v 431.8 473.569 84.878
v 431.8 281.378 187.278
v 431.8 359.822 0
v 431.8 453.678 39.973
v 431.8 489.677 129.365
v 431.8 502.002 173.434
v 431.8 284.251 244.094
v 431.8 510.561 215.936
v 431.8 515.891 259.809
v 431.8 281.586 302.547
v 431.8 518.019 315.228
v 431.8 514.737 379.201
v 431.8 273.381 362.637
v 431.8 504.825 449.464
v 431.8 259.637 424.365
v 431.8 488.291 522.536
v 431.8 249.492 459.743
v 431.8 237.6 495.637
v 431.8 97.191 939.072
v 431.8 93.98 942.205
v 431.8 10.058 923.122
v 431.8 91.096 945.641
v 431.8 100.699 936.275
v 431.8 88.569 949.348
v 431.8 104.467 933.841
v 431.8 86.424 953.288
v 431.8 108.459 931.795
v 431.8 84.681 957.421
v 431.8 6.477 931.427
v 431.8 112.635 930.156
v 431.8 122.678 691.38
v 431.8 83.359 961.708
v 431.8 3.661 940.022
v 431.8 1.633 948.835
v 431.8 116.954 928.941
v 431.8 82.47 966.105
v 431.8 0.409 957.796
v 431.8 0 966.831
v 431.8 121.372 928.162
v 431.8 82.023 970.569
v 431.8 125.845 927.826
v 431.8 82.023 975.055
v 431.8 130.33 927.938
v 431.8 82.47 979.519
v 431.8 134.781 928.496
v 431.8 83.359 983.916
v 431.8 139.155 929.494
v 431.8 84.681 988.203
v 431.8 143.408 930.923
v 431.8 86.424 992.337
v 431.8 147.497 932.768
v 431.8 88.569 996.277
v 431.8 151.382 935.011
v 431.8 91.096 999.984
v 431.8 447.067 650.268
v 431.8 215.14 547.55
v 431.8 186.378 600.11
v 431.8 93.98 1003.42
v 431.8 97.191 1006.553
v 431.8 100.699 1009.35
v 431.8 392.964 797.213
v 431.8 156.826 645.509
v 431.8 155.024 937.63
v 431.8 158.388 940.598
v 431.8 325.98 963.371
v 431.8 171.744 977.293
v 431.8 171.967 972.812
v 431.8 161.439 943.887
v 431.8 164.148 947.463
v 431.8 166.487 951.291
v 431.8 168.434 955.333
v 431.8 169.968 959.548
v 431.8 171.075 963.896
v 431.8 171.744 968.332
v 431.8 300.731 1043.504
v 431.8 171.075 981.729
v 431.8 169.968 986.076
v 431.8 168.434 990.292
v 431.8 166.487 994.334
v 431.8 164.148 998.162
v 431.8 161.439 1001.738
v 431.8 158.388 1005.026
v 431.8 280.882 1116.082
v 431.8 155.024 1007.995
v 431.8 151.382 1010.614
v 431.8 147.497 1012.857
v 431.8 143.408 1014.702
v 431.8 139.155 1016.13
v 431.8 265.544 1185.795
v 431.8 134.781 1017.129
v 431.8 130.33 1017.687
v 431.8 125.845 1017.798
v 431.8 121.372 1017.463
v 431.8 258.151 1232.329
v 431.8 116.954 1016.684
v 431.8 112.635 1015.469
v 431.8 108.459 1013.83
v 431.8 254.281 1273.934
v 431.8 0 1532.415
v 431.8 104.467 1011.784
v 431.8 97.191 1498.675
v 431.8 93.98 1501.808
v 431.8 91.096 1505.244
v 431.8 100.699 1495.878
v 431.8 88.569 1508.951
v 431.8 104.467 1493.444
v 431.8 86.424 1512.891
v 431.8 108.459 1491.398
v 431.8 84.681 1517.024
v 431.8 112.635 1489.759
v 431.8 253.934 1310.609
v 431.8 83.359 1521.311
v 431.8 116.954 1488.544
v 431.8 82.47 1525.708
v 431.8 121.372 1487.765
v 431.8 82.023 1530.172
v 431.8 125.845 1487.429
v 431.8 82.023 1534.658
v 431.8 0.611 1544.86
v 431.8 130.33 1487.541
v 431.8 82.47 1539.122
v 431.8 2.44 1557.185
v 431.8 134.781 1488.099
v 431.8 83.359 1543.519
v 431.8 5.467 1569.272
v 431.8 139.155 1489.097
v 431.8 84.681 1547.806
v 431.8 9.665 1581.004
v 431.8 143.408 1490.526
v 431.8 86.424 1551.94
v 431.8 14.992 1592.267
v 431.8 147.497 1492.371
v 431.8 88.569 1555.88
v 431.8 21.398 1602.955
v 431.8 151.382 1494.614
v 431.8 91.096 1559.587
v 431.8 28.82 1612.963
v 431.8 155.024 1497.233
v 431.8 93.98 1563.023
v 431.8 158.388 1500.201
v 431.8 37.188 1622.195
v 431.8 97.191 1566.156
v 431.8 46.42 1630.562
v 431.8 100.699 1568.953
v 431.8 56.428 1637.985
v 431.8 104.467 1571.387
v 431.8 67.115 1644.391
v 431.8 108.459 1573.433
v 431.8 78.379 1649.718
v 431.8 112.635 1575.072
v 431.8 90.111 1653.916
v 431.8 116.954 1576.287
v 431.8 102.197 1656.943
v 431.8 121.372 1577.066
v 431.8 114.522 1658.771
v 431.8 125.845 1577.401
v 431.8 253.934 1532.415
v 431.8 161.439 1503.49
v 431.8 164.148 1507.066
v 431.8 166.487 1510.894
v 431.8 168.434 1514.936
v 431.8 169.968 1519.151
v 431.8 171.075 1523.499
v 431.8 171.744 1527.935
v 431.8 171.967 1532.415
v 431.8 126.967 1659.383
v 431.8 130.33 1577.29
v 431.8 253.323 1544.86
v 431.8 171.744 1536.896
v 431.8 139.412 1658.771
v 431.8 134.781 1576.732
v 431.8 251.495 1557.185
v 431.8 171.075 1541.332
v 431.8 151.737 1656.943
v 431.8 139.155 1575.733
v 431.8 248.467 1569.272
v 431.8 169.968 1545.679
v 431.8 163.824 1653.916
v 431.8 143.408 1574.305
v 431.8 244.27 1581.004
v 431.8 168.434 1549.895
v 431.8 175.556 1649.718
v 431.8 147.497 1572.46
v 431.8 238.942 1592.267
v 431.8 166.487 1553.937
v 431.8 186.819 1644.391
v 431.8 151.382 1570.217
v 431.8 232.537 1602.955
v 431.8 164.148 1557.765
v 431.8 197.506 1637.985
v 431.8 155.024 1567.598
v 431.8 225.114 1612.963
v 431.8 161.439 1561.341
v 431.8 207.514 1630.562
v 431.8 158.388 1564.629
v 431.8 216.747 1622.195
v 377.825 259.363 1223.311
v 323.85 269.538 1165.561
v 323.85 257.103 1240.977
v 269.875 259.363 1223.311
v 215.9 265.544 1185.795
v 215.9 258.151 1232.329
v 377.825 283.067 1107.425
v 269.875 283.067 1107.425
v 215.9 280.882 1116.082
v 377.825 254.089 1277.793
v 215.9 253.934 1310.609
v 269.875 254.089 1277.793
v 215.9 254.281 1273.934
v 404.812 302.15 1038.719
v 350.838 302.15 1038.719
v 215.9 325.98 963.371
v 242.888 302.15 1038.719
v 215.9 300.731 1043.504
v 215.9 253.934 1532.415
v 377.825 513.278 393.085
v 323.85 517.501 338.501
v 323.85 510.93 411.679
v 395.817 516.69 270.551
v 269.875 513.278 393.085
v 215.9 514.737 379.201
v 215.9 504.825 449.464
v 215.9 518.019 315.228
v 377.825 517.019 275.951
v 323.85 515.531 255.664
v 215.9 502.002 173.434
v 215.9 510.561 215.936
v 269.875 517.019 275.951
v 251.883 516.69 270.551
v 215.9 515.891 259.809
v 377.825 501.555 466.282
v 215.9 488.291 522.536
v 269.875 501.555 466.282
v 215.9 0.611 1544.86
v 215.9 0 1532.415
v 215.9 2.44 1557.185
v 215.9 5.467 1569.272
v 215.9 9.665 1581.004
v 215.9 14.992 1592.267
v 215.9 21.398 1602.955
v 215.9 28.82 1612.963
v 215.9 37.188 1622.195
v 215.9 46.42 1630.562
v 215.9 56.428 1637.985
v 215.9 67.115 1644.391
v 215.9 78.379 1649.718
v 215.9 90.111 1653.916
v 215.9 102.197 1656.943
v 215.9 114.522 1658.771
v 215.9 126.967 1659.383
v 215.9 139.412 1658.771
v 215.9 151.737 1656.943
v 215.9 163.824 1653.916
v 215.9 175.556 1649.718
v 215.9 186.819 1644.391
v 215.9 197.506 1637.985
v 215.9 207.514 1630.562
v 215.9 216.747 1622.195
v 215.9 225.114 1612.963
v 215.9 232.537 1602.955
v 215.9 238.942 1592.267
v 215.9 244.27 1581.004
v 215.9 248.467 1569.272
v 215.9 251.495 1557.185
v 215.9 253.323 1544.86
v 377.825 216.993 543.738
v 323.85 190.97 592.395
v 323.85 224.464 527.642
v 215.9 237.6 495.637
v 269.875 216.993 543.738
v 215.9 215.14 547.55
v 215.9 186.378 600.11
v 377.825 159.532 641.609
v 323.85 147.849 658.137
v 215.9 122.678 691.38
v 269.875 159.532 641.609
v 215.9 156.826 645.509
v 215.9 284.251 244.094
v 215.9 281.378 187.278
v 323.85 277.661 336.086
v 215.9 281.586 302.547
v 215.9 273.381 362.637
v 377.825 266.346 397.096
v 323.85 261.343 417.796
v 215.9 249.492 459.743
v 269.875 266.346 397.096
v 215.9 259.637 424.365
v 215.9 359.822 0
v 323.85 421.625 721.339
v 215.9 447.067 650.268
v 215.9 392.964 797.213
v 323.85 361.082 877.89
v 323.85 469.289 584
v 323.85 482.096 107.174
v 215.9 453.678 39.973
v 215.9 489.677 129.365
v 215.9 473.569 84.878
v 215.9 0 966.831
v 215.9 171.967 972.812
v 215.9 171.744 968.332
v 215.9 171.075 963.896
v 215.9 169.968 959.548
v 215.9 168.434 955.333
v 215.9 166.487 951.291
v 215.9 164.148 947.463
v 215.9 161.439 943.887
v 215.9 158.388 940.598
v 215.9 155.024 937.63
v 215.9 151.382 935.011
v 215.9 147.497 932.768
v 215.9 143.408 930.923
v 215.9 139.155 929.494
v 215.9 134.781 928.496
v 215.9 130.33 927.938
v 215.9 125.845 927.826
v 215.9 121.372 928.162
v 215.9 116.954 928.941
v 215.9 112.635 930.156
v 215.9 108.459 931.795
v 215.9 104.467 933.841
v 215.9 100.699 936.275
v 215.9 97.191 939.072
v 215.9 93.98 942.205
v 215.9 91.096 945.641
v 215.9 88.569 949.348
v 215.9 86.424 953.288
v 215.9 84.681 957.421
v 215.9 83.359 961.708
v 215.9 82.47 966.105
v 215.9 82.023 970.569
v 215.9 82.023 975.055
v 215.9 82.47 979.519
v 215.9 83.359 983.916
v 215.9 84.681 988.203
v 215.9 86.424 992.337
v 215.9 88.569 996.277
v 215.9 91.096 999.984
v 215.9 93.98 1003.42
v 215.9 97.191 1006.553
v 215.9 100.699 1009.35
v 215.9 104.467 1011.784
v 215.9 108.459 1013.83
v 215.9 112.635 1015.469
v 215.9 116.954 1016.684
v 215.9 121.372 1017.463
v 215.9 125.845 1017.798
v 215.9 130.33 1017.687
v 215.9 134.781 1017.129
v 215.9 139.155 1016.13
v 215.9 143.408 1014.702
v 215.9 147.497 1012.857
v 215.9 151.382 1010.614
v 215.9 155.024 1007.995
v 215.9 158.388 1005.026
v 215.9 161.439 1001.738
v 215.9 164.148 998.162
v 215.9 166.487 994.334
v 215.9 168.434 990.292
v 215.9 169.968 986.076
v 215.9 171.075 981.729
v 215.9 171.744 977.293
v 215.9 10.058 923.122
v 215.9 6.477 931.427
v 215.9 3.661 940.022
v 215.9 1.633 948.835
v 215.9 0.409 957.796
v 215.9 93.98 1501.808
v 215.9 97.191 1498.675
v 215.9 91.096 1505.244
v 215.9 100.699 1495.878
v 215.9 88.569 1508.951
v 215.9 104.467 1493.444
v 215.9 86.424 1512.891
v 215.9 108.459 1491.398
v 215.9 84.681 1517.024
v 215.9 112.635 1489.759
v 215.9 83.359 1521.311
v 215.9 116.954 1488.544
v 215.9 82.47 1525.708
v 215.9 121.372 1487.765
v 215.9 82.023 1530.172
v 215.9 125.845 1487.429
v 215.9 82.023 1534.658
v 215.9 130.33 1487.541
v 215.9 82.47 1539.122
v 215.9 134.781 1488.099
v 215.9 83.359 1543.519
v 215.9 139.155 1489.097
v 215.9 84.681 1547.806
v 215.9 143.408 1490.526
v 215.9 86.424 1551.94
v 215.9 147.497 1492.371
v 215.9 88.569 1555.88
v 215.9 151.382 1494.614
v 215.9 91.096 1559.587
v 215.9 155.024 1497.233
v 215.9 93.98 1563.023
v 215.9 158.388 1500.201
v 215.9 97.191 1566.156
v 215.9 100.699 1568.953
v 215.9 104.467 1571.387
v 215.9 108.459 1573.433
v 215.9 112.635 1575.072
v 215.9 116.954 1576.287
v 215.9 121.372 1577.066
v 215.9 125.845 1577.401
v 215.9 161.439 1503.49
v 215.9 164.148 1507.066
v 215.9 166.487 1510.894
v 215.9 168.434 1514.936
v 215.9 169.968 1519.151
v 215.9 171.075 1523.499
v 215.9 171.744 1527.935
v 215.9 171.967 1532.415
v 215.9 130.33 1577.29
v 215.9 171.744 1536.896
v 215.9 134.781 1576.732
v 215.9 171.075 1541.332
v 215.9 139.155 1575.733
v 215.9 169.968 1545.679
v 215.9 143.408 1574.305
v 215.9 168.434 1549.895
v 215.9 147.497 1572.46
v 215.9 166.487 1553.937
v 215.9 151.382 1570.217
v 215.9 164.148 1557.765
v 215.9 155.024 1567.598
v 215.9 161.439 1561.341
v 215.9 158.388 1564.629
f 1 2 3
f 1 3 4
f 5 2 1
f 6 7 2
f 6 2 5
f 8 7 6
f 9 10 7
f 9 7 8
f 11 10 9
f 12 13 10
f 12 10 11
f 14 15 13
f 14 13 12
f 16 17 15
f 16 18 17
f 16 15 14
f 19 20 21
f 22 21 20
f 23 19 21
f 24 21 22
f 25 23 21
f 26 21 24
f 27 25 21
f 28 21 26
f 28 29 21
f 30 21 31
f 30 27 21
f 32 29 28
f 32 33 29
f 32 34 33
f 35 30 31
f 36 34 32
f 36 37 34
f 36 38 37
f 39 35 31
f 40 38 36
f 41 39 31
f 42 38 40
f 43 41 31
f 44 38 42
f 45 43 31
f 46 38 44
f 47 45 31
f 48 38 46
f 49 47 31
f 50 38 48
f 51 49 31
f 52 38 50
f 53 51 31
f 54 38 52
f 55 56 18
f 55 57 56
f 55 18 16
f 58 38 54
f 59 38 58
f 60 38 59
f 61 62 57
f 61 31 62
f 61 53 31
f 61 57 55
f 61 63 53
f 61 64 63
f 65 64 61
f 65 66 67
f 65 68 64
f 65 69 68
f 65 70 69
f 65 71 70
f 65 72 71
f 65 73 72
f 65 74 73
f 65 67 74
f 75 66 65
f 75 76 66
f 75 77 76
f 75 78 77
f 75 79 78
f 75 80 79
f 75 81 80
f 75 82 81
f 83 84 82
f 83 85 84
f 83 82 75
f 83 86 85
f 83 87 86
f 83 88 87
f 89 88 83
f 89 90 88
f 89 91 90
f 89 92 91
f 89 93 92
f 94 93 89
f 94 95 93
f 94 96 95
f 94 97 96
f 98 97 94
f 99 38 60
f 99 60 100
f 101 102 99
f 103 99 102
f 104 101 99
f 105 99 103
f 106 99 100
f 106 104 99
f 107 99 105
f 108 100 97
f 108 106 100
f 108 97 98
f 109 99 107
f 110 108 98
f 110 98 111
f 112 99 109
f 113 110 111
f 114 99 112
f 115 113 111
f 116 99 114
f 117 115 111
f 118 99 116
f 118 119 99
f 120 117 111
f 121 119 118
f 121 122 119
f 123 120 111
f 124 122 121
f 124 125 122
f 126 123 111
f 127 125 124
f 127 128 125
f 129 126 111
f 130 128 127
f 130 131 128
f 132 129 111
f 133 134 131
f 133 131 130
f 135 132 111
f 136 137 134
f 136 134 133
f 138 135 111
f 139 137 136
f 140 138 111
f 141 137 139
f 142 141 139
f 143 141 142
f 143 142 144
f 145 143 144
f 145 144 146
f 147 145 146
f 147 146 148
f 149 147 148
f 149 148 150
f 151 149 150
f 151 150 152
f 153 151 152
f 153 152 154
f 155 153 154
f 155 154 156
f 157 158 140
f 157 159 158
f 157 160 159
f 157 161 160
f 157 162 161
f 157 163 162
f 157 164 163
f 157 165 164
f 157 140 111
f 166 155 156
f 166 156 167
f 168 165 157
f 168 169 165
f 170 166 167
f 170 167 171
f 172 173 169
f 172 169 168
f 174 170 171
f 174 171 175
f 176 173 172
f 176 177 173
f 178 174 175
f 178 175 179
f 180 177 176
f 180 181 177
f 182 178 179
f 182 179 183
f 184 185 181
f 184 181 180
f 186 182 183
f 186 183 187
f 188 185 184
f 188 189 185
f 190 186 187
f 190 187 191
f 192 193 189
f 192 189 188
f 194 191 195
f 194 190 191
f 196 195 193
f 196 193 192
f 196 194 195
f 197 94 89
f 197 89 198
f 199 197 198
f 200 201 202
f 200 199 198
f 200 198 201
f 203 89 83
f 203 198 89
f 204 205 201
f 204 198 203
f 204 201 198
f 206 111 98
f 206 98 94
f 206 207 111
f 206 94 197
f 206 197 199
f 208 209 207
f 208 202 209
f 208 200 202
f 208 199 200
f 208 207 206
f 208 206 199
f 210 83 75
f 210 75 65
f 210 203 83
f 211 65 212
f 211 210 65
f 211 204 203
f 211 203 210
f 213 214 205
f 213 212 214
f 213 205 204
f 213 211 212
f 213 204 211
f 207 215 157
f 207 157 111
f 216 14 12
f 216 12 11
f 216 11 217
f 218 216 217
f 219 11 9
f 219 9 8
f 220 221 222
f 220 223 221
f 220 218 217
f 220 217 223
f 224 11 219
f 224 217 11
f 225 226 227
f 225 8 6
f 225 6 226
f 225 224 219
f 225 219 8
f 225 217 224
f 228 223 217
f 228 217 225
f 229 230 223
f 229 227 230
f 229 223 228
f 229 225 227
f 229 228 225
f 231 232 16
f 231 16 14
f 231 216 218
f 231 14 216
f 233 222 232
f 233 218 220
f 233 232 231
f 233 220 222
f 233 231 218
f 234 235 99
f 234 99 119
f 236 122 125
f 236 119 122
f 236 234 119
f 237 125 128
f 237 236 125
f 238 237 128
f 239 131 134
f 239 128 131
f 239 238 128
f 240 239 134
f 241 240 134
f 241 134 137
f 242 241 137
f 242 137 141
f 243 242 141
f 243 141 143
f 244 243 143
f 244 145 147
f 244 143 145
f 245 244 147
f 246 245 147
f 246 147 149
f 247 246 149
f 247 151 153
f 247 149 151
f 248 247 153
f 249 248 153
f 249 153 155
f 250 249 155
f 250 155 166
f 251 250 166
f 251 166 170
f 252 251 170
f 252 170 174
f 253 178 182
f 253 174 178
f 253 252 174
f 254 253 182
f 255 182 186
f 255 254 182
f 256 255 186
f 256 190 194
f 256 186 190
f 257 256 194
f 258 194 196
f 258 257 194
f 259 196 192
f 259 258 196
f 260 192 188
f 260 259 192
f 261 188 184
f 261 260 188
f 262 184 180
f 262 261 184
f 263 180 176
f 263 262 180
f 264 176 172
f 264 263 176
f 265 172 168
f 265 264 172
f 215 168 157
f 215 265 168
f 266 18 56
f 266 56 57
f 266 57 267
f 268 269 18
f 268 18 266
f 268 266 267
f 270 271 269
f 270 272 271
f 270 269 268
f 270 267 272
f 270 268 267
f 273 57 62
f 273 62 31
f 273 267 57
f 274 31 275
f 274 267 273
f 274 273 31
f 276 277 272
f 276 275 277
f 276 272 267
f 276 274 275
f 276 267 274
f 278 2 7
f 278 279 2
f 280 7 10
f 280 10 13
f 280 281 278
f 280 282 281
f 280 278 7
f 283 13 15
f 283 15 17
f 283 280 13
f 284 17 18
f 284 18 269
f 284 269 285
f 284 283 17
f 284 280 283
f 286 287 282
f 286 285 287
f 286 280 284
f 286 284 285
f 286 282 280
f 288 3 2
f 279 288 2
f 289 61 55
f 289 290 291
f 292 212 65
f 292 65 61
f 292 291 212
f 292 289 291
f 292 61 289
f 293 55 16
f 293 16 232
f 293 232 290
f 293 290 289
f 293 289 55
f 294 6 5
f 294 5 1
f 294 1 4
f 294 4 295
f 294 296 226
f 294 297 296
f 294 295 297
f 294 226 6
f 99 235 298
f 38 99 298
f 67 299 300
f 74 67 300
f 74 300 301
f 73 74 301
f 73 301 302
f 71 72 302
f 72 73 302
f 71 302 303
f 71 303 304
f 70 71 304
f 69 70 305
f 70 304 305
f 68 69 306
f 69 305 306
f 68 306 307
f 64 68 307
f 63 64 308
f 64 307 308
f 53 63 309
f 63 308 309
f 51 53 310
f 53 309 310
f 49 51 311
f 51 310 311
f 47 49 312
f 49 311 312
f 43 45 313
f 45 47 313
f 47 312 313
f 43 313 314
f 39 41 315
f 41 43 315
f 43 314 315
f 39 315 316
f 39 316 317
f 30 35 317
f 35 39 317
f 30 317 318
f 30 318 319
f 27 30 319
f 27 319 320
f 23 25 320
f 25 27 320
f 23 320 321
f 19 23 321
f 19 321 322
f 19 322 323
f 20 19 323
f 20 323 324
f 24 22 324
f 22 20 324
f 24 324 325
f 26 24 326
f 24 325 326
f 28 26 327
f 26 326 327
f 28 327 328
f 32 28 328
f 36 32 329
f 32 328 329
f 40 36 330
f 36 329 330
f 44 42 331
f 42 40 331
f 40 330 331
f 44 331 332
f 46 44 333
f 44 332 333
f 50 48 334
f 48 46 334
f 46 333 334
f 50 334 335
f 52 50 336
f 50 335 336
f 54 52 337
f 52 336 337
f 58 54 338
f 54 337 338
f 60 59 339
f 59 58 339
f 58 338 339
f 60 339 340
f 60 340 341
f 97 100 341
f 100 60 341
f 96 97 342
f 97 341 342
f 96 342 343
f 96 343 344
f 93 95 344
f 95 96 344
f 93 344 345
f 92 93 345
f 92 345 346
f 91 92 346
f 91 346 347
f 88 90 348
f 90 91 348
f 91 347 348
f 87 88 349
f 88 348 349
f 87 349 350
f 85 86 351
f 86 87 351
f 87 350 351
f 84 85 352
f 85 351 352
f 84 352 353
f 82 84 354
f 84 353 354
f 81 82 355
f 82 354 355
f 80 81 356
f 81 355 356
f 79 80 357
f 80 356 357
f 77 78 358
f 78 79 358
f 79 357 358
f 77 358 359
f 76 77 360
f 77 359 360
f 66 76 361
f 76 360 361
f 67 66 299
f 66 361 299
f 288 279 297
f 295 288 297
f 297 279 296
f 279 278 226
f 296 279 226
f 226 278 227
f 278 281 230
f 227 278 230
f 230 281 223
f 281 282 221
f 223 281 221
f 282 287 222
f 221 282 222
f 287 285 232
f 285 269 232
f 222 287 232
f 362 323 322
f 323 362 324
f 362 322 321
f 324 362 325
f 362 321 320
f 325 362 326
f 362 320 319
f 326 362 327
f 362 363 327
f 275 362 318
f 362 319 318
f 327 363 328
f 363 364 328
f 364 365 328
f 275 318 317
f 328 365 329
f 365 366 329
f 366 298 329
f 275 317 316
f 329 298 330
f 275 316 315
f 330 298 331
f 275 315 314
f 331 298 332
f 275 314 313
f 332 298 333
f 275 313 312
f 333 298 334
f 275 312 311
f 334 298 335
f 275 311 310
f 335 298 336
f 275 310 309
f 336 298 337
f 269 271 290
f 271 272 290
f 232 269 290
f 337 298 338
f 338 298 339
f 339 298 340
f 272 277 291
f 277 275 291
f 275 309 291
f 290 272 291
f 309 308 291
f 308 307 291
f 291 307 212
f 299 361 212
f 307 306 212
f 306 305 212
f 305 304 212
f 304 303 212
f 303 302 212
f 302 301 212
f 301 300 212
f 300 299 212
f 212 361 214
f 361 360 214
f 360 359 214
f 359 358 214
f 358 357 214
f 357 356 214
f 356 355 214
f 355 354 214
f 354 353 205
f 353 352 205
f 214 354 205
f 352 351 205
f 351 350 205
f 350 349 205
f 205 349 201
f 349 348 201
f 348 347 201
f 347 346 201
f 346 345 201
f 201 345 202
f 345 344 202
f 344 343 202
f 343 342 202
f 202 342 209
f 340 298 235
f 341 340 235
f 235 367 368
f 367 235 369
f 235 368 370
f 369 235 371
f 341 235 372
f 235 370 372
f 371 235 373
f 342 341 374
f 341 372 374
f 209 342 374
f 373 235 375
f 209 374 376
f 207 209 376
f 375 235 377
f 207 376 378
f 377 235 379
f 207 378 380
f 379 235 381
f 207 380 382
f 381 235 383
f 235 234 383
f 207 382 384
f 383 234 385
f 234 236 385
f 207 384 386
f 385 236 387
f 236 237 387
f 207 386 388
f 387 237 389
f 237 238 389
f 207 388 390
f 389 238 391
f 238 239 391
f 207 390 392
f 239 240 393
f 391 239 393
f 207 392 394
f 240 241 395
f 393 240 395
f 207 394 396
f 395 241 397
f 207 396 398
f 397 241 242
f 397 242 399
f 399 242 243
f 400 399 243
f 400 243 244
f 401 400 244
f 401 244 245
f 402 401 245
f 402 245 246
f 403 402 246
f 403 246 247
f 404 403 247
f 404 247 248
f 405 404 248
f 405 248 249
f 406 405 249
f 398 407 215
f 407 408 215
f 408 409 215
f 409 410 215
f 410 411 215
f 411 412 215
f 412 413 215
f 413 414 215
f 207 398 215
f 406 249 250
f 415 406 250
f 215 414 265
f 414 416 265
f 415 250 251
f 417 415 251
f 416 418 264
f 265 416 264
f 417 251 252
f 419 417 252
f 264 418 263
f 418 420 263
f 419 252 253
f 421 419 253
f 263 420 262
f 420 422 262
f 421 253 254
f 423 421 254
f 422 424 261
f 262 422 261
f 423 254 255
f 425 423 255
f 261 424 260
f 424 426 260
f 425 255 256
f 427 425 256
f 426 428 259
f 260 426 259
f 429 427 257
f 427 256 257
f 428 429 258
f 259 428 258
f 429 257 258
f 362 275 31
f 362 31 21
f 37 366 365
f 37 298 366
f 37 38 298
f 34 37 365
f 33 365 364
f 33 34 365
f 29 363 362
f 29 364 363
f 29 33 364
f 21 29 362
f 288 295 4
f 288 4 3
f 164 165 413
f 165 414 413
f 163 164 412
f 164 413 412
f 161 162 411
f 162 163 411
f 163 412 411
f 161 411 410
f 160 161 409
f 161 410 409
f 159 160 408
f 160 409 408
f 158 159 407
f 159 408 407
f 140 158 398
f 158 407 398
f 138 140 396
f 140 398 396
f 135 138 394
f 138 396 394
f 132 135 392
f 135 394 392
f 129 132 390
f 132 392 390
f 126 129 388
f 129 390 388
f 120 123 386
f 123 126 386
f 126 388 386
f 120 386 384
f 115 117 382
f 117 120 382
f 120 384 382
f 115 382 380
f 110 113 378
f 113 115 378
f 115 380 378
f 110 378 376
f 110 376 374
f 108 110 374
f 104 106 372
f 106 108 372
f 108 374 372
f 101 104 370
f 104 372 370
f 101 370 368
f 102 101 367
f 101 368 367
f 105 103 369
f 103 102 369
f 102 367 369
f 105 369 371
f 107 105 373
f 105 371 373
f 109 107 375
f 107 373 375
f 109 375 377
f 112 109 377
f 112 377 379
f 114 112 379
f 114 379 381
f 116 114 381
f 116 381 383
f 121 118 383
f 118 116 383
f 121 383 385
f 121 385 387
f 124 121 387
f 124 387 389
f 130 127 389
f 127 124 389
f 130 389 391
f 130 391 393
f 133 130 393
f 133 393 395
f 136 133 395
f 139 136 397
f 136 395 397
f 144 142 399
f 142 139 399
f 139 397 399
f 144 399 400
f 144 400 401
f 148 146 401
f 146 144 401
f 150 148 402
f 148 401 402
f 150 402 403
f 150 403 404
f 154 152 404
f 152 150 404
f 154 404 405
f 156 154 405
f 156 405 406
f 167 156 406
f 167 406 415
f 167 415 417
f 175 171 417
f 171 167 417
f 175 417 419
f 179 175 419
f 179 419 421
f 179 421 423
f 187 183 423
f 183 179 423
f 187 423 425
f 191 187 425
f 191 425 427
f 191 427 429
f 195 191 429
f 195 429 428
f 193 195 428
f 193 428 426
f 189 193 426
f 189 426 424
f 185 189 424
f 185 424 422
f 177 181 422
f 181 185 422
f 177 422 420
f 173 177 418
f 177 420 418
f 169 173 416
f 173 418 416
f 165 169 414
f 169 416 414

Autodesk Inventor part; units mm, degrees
ref_plane "YZ Plane" through (0, 0, 0) normal (1, 0, 0) x (0, 1, 0)
ref_plane "XZ Plane" through (0, 0, 0) normal (0, 1, 0) x (-1, 0, 0)
ref_plane "XY Plane" through (0, 0, 0) normal (0, 0, 1) x (1, 0, 0)
ref_plane "Work Plane1" through (215.9, 467.0605, 68.1432) normal (1, 0, 0) x (0, 1, 0)
sketch "Sketch1" plane through (215.9, 467.0605, 68.1432) normal (1, 0, 0) x (0, 1, 0)
  line L0 (-213.126, 1464.2722) -> (-213.126, 1242.4656)
  spline S0 degree 2 poles (-213.126, 1242.4656) (-217.9428, 1125.9893) (-141.0804, 895.2277) knots 0 0 0 1 1 1
  spline S1 degree 2 poles (-141.0804, 895.2277) (-30.9453, 631.5803) (21.2303, 454.393) knots 0 0 0 1 1 1
  spline S2 degree 2 poles (21.2303, 454.393) (72.7957, 260.8739) (34.9413, 105.2911) knots 0 0 0 1 1 1
  spline S3 degree 2 poles (34.9413, 105.2911) (19.2909, 39.5013) (-13.3827, -28.1704) knots 0 0 0 1 1 1
  line L1 (-13.3827, -28.1704) -> (-107.2389, -68.1432)
  line L2 (-107.2389, -68.1432) -> (-185.683, 119.1347)
  spline S4 degree 2 poles (-185.683, 119.1347) (-171.2271, 262.5707) (-229.4608, 427.494) knots 0 0 0 1 1 1
  spline S5 degree 2 poles (-229.4608, 427.494) (-265.2584, 523.1386) (-344.3827, 623.2364) knots 0 0 0 1 1 1
  line L3 (-344.3827, 623.2364) -> (-467.0605, 875.6763)
  line L4 (-467.0605, 1464.2722) -> (-467.0605, 875.6763)
  arc A0 (-213.126, 1464.2722) -> (-467.0605, 1464.2722) centre (-340.0933, 1464.2722) ccw
  circle A1 centre (-340.0933, 1464.2722) radius 45
  circle A2 centre (-340.0933, 904.6692) radius 45
  point P0 (-467.0605, -68.1432)
  point P1 (-203.4806, 1128.5151)
  point P2 (-36.7776, 629.4713)
  point P3 (50.7616, 260.3303)
  point P4 (15.6727, 40.7996)
  point P5 (-188.3614, 260.3302)
  point P6 (-272.8905, 518.7472)
  dimension "d0" = 90
  dimension "d1" = 90
  dimension "d5" = 126.9673
extrude "Extrusion1" add sketch "Sketch1" along normal blind 215.9
fillet "Fillet1" radius 100 1 edges at (323.85, 0, 943.8196)
properties part number "Final Gripper 1"
